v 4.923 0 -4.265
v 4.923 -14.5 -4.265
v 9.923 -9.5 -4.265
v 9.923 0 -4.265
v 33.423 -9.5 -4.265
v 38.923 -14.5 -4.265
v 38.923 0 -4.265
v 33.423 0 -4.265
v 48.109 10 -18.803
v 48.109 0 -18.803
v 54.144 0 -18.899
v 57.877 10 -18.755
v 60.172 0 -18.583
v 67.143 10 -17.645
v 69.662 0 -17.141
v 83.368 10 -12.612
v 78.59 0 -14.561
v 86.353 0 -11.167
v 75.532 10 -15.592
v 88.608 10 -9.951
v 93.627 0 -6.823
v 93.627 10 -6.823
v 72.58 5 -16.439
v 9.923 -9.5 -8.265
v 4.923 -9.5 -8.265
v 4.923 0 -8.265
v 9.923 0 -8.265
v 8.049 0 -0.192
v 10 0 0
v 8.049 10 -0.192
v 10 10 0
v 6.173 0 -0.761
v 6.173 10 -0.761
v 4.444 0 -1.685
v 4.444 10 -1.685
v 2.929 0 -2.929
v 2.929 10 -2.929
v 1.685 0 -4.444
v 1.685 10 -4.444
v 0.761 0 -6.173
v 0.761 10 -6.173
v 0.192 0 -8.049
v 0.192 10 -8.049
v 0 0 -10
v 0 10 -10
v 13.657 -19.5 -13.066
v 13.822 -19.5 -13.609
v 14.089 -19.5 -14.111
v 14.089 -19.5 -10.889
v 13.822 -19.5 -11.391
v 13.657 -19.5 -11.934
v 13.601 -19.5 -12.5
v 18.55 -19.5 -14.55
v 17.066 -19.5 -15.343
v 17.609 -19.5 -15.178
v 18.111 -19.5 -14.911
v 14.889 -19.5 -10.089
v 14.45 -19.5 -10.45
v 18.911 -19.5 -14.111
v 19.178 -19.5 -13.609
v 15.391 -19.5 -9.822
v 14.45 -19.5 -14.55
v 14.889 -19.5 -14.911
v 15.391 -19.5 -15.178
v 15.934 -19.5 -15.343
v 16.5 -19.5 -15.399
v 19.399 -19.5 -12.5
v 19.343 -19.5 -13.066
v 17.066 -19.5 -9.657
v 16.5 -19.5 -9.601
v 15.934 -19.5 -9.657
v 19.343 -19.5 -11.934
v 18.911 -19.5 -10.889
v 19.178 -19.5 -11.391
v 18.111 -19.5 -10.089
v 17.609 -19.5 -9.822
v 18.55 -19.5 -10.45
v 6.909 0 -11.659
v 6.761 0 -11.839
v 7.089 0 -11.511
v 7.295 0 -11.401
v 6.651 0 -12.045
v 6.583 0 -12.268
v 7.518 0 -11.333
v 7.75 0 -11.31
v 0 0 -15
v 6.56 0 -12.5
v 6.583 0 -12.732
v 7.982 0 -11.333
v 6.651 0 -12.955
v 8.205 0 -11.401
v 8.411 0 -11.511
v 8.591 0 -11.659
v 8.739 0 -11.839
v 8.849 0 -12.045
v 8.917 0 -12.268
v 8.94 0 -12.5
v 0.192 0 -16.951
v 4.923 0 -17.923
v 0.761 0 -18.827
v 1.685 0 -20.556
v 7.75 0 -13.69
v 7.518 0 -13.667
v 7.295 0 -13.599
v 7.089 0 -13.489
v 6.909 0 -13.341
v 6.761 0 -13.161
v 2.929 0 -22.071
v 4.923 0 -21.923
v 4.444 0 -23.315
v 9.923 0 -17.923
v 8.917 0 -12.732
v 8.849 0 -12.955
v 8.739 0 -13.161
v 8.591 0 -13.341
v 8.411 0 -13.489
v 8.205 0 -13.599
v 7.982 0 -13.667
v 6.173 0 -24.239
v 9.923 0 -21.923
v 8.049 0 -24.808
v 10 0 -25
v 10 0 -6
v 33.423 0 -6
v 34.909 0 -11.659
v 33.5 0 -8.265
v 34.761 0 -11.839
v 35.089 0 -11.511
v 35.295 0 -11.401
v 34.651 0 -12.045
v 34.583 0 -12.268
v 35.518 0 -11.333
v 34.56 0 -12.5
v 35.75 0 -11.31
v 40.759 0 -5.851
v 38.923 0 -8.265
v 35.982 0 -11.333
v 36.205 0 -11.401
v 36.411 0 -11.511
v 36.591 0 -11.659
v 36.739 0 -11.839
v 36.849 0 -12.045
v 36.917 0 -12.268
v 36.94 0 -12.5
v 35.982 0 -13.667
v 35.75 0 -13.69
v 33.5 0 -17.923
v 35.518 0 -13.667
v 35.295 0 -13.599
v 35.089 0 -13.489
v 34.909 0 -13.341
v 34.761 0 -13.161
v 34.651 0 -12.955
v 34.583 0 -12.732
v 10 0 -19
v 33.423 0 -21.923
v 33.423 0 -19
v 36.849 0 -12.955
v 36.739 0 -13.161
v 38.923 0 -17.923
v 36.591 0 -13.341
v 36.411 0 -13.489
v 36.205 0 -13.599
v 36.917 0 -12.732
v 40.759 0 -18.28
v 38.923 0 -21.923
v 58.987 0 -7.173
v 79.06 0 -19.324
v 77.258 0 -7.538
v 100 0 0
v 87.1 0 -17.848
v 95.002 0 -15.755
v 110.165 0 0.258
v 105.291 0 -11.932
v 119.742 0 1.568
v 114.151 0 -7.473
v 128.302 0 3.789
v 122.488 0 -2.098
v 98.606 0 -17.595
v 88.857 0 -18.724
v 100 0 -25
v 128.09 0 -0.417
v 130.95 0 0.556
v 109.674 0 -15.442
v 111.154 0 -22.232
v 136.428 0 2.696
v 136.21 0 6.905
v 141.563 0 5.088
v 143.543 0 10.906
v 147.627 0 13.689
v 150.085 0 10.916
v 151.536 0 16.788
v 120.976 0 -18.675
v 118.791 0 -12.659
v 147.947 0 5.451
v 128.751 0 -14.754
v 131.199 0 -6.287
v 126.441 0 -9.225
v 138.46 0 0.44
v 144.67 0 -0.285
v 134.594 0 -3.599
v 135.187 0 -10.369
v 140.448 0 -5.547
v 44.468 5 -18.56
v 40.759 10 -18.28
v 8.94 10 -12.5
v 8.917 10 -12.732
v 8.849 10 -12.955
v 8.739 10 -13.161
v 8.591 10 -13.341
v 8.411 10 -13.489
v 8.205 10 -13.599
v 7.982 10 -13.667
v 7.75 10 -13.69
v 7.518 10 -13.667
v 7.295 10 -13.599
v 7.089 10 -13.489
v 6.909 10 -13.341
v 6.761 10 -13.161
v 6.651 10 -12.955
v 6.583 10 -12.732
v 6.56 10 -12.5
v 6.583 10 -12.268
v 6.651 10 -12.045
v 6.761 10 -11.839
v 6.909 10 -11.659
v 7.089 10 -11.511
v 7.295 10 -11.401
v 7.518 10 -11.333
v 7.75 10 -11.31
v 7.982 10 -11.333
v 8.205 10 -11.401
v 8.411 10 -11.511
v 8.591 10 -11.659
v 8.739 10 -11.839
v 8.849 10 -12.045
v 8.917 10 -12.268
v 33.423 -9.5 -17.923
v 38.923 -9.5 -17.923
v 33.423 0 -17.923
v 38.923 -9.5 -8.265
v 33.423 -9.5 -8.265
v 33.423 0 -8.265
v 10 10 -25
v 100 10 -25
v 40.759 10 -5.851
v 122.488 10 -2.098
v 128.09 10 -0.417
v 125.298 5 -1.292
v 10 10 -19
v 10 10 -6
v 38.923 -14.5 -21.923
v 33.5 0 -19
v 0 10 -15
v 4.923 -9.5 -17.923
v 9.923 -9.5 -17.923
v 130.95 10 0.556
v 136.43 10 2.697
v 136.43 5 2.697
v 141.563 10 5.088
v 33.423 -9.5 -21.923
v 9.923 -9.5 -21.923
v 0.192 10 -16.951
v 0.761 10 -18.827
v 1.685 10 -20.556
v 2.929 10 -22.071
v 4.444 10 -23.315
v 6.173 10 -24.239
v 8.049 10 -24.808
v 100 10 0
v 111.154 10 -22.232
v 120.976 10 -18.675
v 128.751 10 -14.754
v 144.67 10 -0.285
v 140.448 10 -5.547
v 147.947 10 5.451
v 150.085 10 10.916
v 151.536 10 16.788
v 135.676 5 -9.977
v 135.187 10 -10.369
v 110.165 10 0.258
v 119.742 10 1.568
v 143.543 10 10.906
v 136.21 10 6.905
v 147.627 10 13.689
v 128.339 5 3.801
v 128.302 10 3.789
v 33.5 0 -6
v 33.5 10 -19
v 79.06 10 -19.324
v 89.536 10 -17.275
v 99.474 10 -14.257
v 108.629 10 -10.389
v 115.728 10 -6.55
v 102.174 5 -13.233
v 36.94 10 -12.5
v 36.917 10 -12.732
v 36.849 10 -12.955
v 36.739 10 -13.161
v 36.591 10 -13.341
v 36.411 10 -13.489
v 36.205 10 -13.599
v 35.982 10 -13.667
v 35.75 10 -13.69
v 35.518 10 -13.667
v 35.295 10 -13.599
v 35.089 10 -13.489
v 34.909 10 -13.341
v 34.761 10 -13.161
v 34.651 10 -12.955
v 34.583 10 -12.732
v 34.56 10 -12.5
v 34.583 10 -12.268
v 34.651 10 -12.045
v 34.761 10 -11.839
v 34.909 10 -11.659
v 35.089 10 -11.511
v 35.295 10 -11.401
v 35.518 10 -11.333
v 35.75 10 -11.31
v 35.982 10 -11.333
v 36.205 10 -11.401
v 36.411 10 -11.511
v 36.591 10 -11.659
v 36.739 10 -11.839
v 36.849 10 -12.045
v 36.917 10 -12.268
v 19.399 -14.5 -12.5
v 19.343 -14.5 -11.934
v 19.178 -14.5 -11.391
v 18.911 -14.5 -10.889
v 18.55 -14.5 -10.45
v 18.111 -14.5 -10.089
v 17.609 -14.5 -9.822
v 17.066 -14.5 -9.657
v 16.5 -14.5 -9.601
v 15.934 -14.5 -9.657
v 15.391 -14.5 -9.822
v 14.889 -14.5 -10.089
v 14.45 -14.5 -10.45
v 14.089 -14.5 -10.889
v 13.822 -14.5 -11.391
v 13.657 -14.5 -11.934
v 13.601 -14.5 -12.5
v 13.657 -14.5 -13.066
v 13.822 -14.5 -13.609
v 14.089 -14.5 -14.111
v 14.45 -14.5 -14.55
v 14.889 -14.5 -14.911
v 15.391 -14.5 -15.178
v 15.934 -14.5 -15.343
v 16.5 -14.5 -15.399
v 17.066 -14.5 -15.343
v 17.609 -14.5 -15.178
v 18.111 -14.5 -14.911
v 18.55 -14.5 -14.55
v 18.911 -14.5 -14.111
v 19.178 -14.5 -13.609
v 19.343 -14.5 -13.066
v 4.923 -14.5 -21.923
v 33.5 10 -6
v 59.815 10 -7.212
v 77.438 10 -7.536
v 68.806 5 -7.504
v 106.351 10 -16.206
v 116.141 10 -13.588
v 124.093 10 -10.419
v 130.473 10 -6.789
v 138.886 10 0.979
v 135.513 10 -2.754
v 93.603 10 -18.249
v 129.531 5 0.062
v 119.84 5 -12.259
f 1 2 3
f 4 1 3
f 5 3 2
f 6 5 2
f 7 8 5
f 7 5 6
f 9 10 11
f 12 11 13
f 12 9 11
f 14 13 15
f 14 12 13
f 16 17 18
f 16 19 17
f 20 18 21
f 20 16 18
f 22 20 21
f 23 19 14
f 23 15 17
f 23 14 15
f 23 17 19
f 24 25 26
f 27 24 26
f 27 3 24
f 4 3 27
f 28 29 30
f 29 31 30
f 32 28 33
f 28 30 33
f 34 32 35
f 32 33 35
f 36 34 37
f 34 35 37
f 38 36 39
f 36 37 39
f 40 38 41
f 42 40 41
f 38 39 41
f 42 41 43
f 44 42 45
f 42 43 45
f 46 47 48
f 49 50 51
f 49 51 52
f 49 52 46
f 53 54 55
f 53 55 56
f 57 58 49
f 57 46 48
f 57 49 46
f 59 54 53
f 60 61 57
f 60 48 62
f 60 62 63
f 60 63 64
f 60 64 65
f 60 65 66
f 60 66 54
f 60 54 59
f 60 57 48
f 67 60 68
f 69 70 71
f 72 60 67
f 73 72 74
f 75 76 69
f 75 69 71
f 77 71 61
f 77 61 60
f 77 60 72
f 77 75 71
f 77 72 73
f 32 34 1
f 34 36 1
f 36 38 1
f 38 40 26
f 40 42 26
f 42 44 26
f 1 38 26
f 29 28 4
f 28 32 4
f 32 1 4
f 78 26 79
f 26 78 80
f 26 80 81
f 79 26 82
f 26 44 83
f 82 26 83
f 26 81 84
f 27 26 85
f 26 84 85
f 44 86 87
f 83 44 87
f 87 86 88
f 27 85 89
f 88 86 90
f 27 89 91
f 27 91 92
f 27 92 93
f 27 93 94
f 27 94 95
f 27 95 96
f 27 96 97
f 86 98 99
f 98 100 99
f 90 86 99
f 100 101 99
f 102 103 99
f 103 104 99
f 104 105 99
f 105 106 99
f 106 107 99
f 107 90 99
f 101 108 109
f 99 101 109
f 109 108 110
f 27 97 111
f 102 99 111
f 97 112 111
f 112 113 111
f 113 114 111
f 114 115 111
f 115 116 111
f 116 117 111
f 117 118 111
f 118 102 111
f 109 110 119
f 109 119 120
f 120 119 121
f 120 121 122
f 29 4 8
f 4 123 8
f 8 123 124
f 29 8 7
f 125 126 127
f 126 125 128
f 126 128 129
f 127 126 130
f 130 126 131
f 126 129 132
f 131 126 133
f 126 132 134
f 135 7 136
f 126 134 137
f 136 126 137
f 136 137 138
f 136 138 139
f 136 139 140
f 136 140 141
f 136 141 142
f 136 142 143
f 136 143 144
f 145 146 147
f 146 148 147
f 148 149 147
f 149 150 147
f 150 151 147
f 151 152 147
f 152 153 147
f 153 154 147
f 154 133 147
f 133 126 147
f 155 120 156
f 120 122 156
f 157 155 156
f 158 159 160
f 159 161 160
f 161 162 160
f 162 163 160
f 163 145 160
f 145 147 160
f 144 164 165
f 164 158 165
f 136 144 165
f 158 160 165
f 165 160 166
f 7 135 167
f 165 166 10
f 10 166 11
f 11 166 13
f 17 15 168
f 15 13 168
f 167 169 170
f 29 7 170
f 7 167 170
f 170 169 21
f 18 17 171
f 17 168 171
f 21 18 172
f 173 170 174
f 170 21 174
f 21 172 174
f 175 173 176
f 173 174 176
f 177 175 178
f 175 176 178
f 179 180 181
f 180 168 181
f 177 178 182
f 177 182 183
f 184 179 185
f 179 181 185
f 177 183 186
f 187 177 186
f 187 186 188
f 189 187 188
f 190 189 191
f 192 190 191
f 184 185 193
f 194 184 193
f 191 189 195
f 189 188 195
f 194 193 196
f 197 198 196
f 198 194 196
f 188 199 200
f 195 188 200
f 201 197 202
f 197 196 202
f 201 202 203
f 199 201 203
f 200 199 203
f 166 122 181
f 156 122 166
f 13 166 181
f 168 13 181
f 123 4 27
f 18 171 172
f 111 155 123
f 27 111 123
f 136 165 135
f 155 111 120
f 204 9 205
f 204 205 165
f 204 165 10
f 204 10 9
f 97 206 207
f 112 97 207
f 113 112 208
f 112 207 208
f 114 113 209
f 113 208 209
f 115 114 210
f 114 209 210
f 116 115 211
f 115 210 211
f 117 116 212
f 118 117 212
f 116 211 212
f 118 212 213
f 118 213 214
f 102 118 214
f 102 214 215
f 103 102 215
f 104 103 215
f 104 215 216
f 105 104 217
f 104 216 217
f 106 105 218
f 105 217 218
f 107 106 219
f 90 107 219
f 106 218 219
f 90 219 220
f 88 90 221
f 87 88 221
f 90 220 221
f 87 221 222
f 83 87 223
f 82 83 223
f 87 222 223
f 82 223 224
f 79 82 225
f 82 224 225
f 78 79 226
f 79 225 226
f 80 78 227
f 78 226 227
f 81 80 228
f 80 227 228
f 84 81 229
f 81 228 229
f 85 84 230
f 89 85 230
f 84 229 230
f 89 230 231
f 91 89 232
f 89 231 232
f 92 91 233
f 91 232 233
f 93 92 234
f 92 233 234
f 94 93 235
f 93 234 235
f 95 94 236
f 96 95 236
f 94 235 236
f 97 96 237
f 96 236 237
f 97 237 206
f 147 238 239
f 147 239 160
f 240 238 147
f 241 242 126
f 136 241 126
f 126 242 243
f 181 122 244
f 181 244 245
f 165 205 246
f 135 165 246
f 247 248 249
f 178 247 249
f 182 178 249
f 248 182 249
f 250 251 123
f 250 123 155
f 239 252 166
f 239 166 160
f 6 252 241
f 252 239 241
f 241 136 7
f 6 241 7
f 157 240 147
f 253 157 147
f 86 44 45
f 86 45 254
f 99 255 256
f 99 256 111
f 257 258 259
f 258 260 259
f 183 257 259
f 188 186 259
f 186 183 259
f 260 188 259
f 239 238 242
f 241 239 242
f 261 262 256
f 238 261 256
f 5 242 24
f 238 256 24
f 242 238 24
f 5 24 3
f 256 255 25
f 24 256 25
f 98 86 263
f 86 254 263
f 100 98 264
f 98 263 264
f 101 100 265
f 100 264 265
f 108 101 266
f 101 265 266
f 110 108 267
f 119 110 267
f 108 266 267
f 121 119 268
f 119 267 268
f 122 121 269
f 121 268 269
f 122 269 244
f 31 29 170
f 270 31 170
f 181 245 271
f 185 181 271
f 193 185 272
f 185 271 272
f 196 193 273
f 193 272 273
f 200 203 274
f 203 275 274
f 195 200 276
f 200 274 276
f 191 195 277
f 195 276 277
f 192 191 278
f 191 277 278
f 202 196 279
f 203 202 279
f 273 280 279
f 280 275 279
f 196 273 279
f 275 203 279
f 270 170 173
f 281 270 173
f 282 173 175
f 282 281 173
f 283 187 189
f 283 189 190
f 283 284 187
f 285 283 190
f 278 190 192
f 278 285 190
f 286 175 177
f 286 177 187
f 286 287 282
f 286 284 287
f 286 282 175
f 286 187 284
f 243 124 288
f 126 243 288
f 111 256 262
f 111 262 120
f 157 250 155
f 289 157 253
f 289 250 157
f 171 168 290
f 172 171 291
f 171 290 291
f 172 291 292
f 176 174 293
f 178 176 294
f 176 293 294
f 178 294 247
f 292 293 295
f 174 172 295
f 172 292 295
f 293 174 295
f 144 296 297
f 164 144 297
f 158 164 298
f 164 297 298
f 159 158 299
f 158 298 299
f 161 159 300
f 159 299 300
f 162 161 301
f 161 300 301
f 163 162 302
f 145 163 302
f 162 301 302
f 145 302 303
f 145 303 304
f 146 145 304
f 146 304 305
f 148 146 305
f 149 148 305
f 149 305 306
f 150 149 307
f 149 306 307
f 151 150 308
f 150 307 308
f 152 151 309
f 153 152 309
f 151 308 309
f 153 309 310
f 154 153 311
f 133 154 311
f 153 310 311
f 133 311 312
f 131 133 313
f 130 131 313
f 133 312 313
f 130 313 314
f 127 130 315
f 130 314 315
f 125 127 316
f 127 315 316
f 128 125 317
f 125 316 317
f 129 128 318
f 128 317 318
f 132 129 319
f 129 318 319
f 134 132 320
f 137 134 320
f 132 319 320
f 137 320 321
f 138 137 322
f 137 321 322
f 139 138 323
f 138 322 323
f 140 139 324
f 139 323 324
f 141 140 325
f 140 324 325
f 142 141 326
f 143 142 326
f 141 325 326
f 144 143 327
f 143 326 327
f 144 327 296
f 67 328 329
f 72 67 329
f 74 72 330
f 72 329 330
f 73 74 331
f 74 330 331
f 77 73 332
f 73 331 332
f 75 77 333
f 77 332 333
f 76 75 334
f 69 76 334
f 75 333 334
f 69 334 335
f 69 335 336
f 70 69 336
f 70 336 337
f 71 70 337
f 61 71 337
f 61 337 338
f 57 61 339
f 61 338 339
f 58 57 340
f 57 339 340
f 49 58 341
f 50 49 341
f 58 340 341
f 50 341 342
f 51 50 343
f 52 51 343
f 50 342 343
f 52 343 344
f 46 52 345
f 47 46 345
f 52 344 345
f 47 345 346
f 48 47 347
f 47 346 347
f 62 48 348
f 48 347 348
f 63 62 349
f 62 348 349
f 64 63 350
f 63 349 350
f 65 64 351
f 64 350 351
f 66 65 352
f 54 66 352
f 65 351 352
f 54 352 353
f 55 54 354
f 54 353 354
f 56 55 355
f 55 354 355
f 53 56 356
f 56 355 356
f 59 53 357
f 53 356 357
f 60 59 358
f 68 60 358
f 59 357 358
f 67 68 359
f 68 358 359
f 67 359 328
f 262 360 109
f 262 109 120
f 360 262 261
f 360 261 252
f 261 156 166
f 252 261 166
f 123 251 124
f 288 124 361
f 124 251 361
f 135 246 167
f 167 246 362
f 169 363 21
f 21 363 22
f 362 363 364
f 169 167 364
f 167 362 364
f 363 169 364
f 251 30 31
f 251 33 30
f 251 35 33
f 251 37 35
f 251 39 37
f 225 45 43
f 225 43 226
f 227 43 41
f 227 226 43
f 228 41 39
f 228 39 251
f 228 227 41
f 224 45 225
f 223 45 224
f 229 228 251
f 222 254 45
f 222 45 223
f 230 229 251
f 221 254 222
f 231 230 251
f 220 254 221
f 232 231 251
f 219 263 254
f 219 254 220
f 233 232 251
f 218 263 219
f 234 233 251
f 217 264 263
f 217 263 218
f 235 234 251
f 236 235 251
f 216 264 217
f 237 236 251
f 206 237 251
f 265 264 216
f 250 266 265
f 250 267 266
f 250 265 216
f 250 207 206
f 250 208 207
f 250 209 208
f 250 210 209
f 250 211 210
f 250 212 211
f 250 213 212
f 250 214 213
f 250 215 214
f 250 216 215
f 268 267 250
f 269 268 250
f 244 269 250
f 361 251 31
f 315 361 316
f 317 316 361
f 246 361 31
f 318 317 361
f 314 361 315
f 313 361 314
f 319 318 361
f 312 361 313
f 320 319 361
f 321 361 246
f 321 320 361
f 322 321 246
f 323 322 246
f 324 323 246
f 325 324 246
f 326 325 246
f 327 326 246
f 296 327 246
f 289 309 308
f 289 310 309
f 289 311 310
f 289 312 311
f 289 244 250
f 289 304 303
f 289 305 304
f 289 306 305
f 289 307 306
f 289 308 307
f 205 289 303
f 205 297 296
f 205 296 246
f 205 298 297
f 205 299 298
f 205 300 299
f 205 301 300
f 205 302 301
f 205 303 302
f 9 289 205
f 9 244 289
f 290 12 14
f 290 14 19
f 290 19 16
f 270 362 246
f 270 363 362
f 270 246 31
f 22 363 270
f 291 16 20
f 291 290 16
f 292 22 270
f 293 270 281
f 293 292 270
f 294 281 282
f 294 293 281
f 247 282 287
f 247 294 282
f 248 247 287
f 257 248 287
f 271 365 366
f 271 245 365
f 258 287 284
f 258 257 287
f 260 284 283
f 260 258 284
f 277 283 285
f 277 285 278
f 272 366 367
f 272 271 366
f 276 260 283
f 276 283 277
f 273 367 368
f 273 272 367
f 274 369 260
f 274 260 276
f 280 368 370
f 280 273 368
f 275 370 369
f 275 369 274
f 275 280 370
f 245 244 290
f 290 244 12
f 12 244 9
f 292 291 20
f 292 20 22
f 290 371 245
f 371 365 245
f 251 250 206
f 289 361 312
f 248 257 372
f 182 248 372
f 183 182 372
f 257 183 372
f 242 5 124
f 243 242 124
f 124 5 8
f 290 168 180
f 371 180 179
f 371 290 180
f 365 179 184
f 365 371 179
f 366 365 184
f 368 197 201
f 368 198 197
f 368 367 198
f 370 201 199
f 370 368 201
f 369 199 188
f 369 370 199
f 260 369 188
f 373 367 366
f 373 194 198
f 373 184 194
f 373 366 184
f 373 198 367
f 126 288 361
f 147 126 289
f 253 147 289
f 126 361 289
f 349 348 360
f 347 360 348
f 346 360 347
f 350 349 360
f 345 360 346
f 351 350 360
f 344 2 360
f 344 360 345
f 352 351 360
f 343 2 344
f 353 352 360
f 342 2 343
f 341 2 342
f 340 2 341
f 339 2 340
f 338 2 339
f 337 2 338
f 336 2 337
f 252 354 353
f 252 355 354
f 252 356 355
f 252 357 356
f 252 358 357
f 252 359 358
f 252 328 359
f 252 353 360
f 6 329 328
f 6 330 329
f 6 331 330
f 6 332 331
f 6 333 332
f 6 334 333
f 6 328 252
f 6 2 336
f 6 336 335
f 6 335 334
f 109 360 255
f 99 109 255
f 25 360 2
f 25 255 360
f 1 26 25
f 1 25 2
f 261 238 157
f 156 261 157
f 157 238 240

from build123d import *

# Parameters (mm, degrees)
SKETCH1_W           = 100
SKETCH1_H           = 25
BOSS_EXTRUDE1_DEPTH = 10
SKETCH2_R           = 1.19
SKETCH2_W           = 23.5
SKETCH2_H           = 13
CUT_EXTRUDE1_DEPTH  = 10
BOSS_EXTRUDE2_DEPTH = 10
FILLET1_R           = 10
SKETCH7_W           = 34
SKETCH7_H           = 17.658274854
BOSS_EXTRUDE3_DEPTH = 14.5
SKETCH8_W           = 23.5
SKETCH8_H           = 9.5
CUT_EXTRUDE2_DEPTH  = 21.735155199
SKETCH9_W           = 9.658274854
SKETCH9_H           = 9.5
CUT_EXTRUDE3_DEPTH  = 147.612554477
SKETCH10_R          = 2.899136991
BOSS_EXTRUDE4_DEPTH = 5
CUT_EXTRUDE4_DEPTH  = 30.5


with BuildPart() as part:
    # Sketch1 → Boss-Extrude1 (new body)
    with BuildSketch(Plane(origin=(0, 0, 0), x_dir=(1, 0, 0), z_dir=(0, 1, 0))):
        with Locations((50, 12.5)):
            Rectangle(SKETCH1_W, SKETCH1_H)
    extrude(amount=BOSS_EXTRUDE1_DEPTH)

    # Sketch2 → Cut-Extrude1 (cut)
    with BuildSketch(Plane(origin=(0, 10, 0), x_dir=(1, 0, 0), z_dir=(0, 1, 0))):
        with Locations((7.75, 12.5)):
            Circle(SKETCH2_R)
        with Locations((35.75, 12.5)):
            Circle(SKETCH2_R)
        with Locations((21.75, 12.5)):
            Rectangle(SKETCH2_W, SKETCH2_H)
    extrude(amount=-CUT_EXTRUDE1_DEPTH, mode=Mode.SUBTRACT)

    # Sketch3 → Boss-Extrude2 (add)
    with BuildSketch(Plane(origin=(0, 10, 0), x_dir=(1, 0, 0), z_dir=(0, 1, 0))):
        with BuildLine():
            add(Edge.make_bspline(
                [(100, 0), (130.91054584, 0.791905692), (151.535957226, -16.787524717)],
                knots=[0, 0, 0, 1, 1, 1], degree=2))
            add(Edge.make_bspline(
                [(100, 25), (145.583275761, 15.848400437), (151.535957226, -16.787524717)],
                knots=[0, 0, 0, 1, 1, 1], degree=2))
            Line((100, 25), (100, 0))
        make_face()
    extrude(amount=-BOSS_EXTRUDE2_DEPTH)

    # Fillet1
    fillet1_edges = [part.edges().sort_by_distance(p)[0] for p in [
        (0, 5, -25),
        (0, 5, 0),
    ]]
    fillet(fillet1_edges, radius=FILLET1_R)

    # Sketch7 → Boss-Extrude3 (add)
    with BuildSketch(Plane.XZ):
        with Locations((21.923402849, -13.093982328)):
            Rectangle(SKETCH7_W, SKETCH7_H)
    extrude(amount=BOSS_EXTRUDE3_DEPTH)

    # Sketch8 → Cut-Extrude2 (cut, through all)
    with BuildSketch(Plane.XY.offset(-4.264844901)):
        with Locations((21.673402849, -4.75)):
            Rectangle(SKETCH8_W, SKETCH8_H)
    extrude(amount=-CUT_EXTRUDE2_DEPTH, mode=Mode.SUBTRACT)

    # Sketch9 → Cut-Extrude3 (cut, through all)
    with BuildSketch(Plane.ZY.offset(-4.923402849)):
        with Locations((-13.093982328, -4.75)):
            Rectangle(SKETCH9_W, SKETCH9_H)
    extrude(amount=-CUT_EXTRUDE3_DEPTH, mode=Mode.SUBTRACT)

    # Sketch10 → Boss-Extrude4 (add)
    with BuildSketch(Plane.XZ.offset(14.5)):
        with Locations((16.5, -12.5)):
            Circle(SKETCH10_R)
    extrude(amount=BOSS_EXTRUDE4_DEPTH)

    # Sketch13 → Cut-Extrude4 (cut, through all)
    with BuildSketch(Plane(origin=(0, 10, 0), x_dir=(1, 0, 0), z_dir=(0, 1, 0))):
        with BuildLine():
            Line((40.759141507, 18.280493838), (40.759141507, 13.958351936))
            Line((40.759141507, 13.958351936), (40.759141507, 5.850917493))
            add(Edge.make_bspline(
                [(40.759141507, 5.850917493), (70.418760449, 8.670764937), (93.626937349, 6.822983821)],
                knots=[0, 0, 0, 0.76207728, 0.76207728, 0.76207728], degree=2))
            add(Edge.make_bspline(
                [(48.109032445, 18.802566203), (74.292639641, 20.065268225), (93.626937349, 6.822983821)],
                knots=[0, 0, 0, 0.932257027, 0.932257027, 0.932257027], degree=2))
            add(Edge.make_bspline(
                [(40.759141507, 18.280493838), (44.500946657, 18.577601375), (48.109032445, 18.802566203)],
                knots=[0, 0, 0, 0.044284704, 0.044284704, 0.044284704], degree=2))
        make_face()
        with BuildLine():
            add(Edge.make_bspline(
                [(79.05980568, 19.324038395), (129.368985963, 17.399904925), (141.56306601, -5.087642347)],
                knots=[0.252338304, 0.252338304, 0.252338304, 1, 1, 1], degree=2))
            add(Edge.make_bspline(
                [(79.05980568, 19.324038395), (103.573343897, 15.754713023), (122.487748371, 2.098418722)],
                knots=[0, 0, 0, 0.958850714, 0.958850714, 0.958850714], degree=2))
            add(Edge.make_bspline(
                [(122.487748371, 2.098418722), (125.30805626, 1.325368592), (128.089706455, 0.417067533)],
                knots=[0.632770601, 0.632770601, 0.632770601, 0.8750054, 0.8750054, 0.8750054], degree=2))
            add(Edge.make_bspline(
                [(128.089706455, 0.417067533), (129.541401077, -0.054077042), (130.95010952, -0.556322186)],
                knots=[0, 0, 0, 0.199498744, 0.199498744, 0.199498744], degree=2))
            add(Edge.make_bspline(
                [(130.95010952, -0.556322186), (136.602640718, -2.571612406), (141.56306601, -5.087642347)],
                knots=[0.199498744, 0.199498744, 0.199498744, 1, 1, 1], degree=2))
        make_face()
    extrude(amount=-CUT_EXTRUDE4_DEPTH, mode=Mode.SUBTRACT)


solid = part.part
